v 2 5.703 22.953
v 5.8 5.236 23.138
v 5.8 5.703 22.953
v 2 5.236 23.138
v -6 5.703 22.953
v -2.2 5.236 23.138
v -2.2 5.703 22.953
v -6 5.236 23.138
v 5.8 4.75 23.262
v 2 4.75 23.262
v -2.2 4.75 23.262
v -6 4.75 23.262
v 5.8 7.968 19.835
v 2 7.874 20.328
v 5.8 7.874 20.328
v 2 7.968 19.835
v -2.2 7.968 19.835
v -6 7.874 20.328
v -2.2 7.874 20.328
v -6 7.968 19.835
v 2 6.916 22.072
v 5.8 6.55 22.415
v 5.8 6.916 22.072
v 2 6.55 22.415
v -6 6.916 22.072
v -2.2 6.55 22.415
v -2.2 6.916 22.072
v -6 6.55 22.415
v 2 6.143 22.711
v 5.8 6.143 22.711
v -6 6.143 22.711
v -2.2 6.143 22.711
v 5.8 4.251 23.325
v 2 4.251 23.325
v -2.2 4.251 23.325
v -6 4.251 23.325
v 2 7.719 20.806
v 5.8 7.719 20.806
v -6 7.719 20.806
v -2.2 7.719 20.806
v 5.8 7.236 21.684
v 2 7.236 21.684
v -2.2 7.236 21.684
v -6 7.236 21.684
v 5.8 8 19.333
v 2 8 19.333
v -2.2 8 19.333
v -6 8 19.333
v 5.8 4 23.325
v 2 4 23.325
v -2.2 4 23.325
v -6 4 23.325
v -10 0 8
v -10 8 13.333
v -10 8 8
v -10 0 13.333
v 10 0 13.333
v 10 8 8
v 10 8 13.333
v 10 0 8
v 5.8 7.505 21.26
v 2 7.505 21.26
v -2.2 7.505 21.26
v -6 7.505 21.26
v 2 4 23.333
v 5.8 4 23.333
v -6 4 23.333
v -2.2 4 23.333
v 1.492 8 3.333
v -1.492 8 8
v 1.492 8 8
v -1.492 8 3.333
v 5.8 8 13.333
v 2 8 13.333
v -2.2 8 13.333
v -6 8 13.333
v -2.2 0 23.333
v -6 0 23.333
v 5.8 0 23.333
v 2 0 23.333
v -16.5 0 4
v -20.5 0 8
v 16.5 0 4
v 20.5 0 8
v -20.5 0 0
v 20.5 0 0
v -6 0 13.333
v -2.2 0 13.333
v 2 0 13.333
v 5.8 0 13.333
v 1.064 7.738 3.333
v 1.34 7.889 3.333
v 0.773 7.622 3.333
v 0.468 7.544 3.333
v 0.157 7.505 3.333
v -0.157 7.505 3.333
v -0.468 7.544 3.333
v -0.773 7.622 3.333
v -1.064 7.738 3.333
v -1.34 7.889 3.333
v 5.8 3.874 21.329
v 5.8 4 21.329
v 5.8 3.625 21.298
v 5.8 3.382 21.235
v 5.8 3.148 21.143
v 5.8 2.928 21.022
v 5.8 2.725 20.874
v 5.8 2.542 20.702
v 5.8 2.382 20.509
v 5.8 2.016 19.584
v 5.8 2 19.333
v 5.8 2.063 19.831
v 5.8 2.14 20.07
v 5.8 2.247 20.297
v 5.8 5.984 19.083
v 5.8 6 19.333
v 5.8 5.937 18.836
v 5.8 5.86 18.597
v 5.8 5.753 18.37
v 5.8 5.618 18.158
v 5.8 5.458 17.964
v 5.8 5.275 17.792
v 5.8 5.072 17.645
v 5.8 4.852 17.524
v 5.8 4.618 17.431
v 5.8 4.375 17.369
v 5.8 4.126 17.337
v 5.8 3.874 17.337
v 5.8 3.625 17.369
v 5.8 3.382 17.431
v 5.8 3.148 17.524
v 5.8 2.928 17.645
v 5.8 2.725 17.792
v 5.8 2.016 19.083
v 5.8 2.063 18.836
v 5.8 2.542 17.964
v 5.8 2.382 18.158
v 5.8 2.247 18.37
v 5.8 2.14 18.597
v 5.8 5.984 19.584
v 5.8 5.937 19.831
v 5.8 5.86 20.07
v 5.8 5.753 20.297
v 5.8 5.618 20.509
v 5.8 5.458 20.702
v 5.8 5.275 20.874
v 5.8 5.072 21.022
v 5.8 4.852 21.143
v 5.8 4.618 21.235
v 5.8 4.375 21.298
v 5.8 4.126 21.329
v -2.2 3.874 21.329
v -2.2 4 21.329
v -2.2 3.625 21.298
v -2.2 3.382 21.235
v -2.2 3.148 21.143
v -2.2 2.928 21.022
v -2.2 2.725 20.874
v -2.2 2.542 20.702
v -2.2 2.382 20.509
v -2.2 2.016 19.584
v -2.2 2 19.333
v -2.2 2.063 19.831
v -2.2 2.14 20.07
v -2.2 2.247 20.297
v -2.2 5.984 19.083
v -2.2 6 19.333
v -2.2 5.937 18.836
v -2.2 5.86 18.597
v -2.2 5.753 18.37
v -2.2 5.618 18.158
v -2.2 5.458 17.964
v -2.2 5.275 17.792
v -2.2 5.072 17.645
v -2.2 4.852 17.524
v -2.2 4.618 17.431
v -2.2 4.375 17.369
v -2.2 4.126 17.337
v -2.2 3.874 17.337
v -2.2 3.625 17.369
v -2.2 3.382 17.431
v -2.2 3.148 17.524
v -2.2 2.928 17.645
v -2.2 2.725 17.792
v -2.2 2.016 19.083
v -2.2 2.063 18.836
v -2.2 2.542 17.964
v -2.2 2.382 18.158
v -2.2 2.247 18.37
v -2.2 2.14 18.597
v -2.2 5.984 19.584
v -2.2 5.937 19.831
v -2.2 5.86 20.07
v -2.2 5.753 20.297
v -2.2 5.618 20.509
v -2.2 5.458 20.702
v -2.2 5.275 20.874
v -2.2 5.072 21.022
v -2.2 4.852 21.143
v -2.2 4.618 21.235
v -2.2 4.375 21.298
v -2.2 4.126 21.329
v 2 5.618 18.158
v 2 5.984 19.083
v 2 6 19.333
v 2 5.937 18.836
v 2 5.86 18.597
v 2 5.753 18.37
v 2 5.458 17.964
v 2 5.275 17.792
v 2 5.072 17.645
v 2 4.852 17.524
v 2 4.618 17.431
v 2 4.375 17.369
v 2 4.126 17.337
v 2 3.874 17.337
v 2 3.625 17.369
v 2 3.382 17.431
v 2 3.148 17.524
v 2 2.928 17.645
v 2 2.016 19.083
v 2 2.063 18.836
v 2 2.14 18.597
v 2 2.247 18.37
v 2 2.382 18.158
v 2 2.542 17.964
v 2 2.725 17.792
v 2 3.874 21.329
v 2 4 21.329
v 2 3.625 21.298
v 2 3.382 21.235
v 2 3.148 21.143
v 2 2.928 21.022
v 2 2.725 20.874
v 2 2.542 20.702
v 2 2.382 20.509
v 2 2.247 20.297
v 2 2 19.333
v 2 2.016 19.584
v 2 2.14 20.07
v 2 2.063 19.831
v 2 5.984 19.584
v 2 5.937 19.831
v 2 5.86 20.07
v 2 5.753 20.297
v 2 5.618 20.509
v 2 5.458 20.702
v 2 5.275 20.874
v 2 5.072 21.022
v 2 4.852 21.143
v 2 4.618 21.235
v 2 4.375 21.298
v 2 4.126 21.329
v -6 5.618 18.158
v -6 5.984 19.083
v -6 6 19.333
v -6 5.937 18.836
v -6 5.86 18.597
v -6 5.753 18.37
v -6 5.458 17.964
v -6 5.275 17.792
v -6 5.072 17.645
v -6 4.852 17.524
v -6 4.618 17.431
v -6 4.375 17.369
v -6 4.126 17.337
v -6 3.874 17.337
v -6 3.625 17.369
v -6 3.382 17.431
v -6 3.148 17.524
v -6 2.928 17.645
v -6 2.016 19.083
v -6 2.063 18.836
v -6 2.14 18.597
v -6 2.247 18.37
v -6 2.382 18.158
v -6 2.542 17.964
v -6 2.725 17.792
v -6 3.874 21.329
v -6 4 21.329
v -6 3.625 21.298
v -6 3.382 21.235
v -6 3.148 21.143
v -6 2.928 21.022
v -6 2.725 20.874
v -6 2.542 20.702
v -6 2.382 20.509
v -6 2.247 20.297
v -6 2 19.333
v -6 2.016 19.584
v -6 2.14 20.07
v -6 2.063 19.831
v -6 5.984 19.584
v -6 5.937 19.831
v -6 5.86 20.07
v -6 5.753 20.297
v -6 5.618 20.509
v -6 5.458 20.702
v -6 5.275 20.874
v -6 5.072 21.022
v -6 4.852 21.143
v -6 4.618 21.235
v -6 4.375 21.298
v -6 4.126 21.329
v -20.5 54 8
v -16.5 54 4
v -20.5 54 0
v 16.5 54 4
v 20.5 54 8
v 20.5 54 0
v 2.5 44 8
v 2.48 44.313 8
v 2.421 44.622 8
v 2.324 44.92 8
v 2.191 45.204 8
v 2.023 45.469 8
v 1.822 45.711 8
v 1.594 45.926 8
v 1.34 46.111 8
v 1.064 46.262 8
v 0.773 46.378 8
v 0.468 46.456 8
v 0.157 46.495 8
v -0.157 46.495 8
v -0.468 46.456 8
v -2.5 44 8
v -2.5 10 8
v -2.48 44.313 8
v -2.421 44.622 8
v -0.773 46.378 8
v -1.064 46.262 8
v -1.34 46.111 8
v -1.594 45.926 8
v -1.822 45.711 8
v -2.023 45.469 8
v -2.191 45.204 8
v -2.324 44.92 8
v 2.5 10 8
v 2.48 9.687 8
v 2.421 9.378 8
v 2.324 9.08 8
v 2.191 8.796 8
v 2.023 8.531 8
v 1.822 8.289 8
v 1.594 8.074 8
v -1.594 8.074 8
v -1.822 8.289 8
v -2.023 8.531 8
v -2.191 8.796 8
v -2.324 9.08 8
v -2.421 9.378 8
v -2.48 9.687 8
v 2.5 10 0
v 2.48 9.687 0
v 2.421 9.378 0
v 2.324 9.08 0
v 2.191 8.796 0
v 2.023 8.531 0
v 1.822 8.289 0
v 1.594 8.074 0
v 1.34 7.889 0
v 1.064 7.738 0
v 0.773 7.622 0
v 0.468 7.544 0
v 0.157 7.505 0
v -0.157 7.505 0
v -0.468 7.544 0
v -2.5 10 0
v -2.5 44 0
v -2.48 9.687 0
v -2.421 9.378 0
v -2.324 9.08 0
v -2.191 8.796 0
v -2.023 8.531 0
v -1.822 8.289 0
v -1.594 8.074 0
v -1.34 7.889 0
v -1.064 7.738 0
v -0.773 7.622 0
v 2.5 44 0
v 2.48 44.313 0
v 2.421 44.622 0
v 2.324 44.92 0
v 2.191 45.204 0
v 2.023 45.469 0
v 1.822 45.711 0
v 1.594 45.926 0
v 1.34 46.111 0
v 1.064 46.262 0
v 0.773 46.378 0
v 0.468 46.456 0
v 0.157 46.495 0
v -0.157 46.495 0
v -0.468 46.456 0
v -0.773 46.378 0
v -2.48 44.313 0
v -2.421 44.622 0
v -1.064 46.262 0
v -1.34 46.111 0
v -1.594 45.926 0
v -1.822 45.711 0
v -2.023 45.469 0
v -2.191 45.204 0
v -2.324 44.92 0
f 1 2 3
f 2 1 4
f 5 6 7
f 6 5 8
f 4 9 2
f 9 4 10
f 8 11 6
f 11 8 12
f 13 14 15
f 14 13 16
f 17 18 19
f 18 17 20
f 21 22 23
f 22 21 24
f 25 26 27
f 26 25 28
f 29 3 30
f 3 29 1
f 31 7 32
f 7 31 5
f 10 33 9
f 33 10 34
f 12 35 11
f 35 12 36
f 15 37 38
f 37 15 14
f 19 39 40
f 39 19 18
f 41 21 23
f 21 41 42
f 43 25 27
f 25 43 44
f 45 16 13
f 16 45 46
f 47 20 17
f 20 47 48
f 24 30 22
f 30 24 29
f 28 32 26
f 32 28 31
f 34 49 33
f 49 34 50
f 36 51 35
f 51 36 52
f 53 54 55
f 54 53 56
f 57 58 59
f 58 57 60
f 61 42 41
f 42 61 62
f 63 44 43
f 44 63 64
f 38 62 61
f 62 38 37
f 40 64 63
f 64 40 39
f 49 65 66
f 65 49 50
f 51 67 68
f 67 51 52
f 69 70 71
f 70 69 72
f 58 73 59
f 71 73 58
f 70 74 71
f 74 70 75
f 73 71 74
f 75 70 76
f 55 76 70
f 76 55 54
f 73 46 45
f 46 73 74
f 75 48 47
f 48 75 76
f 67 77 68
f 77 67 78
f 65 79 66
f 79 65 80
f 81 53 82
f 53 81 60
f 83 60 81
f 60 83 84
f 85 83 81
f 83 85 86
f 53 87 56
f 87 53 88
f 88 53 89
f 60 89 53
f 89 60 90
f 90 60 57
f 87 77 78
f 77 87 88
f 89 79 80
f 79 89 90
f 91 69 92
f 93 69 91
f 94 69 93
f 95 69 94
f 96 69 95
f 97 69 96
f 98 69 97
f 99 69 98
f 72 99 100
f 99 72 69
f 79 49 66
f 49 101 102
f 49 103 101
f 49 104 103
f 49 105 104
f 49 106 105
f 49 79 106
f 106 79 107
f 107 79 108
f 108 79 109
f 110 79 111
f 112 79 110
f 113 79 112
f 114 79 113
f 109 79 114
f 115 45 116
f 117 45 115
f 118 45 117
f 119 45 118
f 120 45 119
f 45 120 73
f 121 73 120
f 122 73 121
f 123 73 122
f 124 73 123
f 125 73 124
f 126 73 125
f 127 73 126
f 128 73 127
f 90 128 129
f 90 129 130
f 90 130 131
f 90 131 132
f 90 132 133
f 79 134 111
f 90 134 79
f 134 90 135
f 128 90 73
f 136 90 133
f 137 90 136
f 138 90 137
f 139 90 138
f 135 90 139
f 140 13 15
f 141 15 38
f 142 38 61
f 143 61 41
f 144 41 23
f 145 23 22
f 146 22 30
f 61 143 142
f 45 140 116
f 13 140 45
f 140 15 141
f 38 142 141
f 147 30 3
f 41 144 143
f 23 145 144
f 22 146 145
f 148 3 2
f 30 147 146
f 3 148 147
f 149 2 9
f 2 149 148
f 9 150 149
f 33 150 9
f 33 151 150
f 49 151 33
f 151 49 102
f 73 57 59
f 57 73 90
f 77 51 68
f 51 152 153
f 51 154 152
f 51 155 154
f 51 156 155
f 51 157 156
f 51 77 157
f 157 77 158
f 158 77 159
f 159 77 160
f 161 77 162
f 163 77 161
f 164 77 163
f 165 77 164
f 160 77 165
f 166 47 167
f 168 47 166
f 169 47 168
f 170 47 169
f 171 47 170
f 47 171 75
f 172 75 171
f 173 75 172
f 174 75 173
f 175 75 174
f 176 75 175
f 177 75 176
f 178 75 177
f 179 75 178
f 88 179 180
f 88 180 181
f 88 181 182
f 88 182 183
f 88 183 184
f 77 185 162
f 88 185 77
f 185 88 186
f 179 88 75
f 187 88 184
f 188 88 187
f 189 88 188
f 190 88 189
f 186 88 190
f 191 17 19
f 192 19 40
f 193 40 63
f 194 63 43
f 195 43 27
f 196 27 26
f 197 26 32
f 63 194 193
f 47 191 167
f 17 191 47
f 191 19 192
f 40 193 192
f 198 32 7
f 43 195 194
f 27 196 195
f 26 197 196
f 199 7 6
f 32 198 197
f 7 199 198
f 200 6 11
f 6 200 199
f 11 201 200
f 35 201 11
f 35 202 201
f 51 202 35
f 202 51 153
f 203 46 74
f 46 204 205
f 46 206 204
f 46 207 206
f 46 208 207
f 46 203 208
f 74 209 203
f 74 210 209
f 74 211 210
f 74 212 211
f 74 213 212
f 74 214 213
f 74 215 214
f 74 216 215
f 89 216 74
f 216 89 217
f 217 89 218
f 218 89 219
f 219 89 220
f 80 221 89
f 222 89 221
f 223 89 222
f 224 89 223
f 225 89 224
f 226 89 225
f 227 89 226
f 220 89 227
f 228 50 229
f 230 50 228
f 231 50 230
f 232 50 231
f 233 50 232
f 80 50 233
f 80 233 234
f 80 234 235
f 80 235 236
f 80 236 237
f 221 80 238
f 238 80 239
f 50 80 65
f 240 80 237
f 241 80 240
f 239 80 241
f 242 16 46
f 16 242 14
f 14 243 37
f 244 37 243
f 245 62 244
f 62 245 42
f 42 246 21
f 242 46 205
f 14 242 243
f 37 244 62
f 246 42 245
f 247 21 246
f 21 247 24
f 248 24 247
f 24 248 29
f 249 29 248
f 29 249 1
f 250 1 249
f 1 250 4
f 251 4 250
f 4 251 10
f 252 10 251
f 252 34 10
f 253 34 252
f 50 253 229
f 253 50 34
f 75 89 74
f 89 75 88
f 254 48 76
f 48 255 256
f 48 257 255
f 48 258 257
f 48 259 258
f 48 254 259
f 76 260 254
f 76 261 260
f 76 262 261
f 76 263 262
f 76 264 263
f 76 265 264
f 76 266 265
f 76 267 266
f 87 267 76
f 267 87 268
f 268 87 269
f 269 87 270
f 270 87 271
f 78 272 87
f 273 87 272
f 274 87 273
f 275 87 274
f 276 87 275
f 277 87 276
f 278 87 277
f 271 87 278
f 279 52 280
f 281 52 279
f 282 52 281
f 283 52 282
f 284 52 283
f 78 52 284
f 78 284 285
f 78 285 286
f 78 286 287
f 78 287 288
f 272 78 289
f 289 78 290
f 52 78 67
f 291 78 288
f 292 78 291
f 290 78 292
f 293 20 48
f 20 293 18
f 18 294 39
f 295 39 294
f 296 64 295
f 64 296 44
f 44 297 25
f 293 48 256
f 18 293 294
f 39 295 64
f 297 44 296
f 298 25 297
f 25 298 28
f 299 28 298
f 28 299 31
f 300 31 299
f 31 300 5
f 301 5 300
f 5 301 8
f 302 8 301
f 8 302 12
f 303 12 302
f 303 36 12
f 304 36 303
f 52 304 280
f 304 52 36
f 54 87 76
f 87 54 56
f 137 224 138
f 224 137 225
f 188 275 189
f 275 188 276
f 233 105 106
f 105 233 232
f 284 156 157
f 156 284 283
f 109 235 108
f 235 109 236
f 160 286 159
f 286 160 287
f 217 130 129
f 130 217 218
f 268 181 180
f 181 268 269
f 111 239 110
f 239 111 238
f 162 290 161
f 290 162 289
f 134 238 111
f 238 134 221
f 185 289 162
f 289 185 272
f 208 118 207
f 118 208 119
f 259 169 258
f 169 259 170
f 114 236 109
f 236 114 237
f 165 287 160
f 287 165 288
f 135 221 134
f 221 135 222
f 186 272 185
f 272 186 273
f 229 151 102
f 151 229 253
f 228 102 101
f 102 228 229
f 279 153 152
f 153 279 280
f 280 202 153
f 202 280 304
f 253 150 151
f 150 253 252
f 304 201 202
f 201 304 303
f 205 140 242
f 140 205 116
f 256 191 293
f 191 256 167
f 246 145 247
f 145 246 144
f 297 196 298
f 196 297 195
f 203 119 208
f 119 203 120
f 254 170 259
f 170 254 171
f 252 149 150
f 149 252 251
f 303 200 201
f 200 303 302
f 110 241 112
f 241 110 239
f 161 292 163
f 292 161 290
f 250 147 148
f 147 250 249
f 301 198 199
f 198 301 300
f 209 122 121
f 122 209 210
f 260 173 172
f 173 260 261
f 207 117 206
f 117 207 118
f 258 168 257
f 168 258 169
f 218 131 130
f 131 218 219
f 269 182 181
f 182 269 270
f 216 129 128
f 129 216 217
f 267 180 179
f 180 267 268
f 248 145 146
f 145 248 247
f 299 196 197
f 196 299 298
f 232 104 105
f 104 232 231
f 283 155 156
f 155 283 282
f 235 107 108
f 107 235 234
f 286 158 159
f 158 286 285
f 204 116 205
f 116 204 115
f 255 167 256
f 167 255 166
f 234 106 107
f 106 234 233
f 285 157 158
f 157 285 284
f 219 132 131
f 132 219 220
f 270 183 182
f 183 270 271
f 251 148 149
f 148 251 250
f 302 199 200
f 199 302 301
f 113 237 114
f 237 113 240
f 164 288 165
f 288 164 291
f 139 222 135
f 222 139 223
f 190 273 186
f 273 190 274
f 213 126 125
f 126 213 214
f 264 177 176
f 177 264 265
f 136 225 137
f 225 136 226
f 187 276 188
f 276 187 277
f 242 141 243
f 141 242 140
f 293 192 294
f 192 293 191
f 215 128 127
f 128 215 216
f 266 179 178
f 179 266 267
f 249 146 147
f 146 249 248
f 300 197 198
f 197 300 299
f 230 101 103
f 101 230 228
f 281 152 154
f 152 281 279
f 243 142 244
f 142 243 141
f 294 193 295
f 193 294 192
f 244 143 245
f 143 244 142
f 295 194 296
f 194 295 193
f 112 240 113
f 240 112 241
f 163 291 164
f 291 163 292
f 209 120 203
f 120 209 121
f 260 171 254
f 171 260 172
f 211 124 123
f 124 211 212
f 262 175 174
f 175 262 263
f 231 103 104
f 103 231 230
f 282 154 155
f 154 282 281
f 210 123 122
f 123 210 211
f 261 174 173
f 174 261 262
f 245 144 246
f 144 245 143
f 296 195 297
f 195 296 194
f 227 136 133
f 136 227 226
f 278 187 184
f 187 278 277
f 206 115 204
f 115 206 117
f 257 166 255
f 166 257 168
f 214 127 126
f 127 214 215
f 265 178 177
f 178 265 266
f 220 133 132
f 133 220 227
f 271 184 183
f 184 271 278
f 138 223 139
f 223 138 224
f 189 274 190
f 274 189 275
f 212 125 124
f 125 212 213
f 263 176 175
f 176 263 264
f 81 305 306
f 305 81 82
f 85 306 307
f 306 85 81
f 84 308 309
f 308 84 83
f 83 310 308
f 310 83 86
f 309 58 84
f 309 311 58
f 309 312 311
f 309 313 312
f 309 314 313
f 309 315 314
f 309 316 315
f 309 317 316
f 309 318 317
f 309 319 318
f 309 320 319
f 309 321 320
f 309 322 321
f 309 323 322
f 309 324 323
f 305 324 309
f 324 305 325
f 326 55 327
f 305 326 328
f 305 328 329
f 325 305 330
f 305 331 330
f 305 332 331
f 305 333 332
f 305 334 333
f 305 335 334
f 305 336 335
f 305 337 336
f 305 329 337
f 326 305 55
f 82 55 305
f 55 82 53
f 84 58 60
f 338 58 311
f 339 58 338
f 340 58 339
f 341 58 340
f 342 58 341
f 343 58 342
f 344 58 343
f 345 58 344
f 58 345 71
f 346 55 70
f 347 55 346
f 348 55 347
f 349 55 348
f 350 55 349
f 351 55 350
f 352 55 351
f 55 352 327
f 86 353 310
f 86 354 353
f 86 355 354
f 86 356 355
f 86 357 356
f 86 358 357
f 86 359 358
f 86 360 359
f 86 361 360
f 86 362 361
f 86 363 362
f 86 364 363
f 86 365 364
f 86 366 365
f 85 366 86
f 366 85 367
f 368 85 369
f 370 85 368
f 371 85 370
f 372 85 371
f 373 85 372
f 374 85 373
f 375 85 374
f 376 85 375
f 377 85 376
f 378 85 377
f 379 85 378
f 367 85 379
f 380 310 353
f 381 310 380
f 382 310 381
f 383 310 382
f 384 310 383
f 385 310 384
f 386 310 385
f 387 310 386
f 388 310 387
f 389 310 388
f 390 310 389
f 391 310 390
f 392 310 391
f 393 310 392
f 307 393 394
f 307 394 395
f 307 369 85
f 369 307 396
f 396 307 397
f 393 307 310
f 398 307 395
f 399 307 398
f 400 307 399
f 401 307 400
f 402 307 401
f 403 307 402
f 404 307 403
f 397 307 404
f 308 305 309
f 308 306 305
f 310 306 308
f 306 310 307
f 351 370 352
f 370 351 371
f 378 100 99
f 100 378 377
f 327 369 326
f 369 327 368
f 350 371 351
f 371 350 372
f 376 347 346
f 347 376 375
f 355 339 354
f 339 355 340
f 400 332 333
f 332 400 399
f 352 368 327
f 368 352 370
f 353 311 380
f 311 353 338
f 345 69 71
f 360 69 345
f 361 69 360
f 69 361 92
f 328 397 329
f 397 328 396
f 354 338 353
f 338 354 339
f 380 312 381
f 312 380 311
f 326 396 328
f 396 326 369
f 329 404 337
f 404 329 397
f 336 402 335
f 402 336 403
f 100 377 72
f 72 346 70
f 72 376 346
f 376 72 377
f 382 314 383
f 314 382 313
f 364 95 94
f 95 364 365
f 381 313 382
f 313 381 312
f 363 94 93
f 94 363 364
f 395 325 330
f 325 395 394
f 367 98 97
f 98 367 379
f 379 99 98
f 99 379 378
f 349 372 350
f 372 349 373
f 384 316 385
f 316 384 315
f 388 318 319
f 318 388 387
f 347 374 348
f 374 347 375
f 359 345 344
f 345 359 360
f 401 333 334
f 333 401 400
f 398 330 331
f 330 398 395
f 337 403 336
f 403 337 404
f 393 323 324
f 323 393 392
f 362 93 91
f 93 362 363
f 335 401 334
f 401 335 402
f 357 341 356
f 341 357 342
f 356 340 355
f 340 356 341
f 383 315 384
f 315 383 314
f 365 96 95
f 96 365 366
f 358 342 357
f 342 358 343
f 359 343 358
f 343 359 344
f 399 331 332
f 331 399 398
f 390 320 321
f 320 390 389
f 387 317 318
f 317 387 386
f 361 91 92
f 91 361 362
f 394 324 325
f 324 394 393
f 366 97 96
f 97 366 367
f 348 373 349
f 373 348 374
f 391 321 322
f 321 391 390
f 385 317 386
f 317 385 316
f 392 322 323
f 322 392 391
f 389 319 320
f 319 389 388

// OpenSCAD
$fn=50;

//roundedRect([10,150,5], 3);

fullWidth = 20;
w = fullWidth;
h = 8;
l = 180;
pin=4;
flange = 44;
etube = 10;
d2 = 65;
d1 = 55;
base = 2;
sensor = 20;  // Make it oversize so we can use ground-glass focussing screen
fudge = 1;
hingeTol = 0.2; // tightness of fit
hingeGap = 2;   // Extra length on arms

module laserMount() 
{
  translate([fullWidth/2,-l,h])
    difference()
    {
      cylinder(h=20,r=5);
      cylinder(h=21,r=3.3);  // Shouldq be 6.5/2 but holes seem to print smaller than you ask
    }
}

module arm()
{
  translate([-w/2,-w,0])
  {
    linear_extrude(height=h)
      hull()
      {
        translate([fullWidth/2,-l])
          circle(r=5);
        square(size=[fullWidth,1]);
      }
    translate([w/2,w/2]) hinge();
    laserMount();
  }
}

module hinge(pins=2)
{
  translate([-w/2,-w/2,0]) difference()
  {
    intersection()
    {
      linear_extrude(height=h)
        hull()
        {
          square(size=fullWidth);
        }

      // This rounds off the hinge end
      difference()
      {
        translate([0,-l-fullWidth,0])
          cube([fullWidth,l+fullWidth*2,h]);
        difference()
        {
          translate([0,fullWidth-h/2,h/2])
            cube([fullWidth,h/2,h/2]);
          difference()
          {
            translate([0,fullWidth-h/2,h/2])
              rotate([0,90,0])
                cylinder(h=fullWidth,r=h/2);
            translate([0,0,0])
              cube([fullWidth,fullWidth,h/2]);
            translate([0,0,0])
              cube([fullWidth,fullWidth-h/2,h*2]);
          }
        }
      }
    }
    if (pins==2)
    {
      translate([0*w/5,w-h-hingeGap,0]) cube([w/5+hingeTol,h+hingeGap,h]);
      translate([2*w/5,w-h-hingeGap,0]) cube([w/5+hingeTol,h+hingeGap,h]);
      translate([4*w/5,w-h-hingeGap,0]) cube([w/5+hingeTol,h+hingeGap,h]);
    } else {
      translate([1*w/5,w-h-hingeGap,0]) cube([w/5+hingeTol,h+hingeGap,h]);
      translate([3*w/5,w-h-hingeGap,0]) cube([w/5+hingeTol,h+hingeGap,h]);
    }
    translate([0,w-h/2,h/2])
      rotate([0,90,0])
        cylinder(h=fullWidth,r=pin/2);
  }
}

module arca_plate(l,h=10)
{
  // Specs suggest 38mm is the width, as do measurements,
  // but when I printed at 38mm it came out too narrow to be gripped..
  width = 41;
  translate([-width/2,,0,0])
    difference()
    {
      cube([width,l,h]);
      union()
      {
        translate([-fudge,-fudge,h/2])
          prism(l+fudge*2, h/2+fudge, h/2+fudge);
        translate([-fudge,-fudge,h/2])
          prism(l+fudge*2, h/2+fudge, -h/2-fudge);
        translate([width+fudge,-fudge,h/2])
          prism(l+fudge*2, -h/2-fudge, h/2+fudge);
        translate([width+fudge,-fudge,h/2])
          prism(l+fudge*2, -h/2-fudge, -h/2-fudge);
      }
    }
}

module sensor()
{
  translate([0,-(w/4+d2/2),0])
  {
    // Hinges for laser arms
    translate([0,0,h]) rotate([0,0,180]) hinge();
    translate([0,w/2+d2,h]) hinge();
    // Adjustor plates for laser arms
    difference() {
      translate([-w/2,-w*2,0]) roundedRect([w,w*2.5,h],2);
      translate([-w/2+4,-w*2+4,0]) cylinder(h,r=2);
      translate([w/2-4,-w*2+4,0]) cylinder(h,r=2);
    }
    difference() {
      translate([-w/2,d2,0]) roundedRect([w,w*2.5,h],2);
      translate([-w/2+4,d2+w*2.5-4,0]) cylinder(h,r=2);
      translate([w/2-4,d2+w*2.5-4,0]) cylinder(h,r=2);
    }
    // Hinge for tripod mount
    translate([-d2/2-w/4,d2/2+w/4,0]) rotate([0,0,90]) hinge(pins=3);
    translate([0,w/4+d2/2,0]) 
      difference()
      {
        cylinder(r=d2/2,h=flange+etube);
        translate([0,0,flange+etube-12]) rotate([0,-90,0]) cylinder(h=100,r=2); // Screw hole
        translate([0,0,base])
          cylinder(r=d1/2,h=flange+etube+fudge);  // inside
        translate([0,0,-fudge/2])
          cylinder(r=sensor/2,h=base+fudge);  // sensor hole
      }
  }
}

module mount()
{
  translate([0,0,2*w/3]) rotate([90,0,180]) hinge();
  difference ()
  {
    arca_plate(flange+etube,8);
    linear_extrude(height=30)
      hull()
      {
        translate([0,10,0]) circle(r=2.5);
        translate([0,flange+etube-10,0]) circle(r=2.5);
      }
  }
}

//arm();
//sensor();
mount();

//Draw a prism based on a 
//right angled triangle
//l - length of prism
//w - width of triangle
//h - height of triangle
module prism(l, w, h) {
       polyhedron(points=[
               [0,0,h],           // 0    front top corner
               [0,0,0],[w,0,0],   // 1, 2 front left & right bottom corners
               [0,l,h],           // 3    back top corner
               [0,l,0],[w,l,0]    // 4, 5 back left & right bottom corners
       ], faces=[ // points for all faces must be ordered clockwise when looking in
               [0,2,1],    // top face
               [3,4,5],    // base face
               [0,1,4,3],  // h face
               [1,2,5,4],  // w face
               [0,3,5,2],  // hypotenuse face
       ]);
}

module roundedRect(size, radius)
{
    x = size[0];
    y = size[1];
    z = size[2];
    linear_extrude(height=z)
    hull()
    {
        // place 4 circles in the corners, with the given radius
        translate([(radius/2), (radius/2), 0])
        circle(r=radius);

        translate([x-(radius/2), (radius/2), 0])
        circle(r=radius);

        translate([(radius/2), y-(radius/2), 0])
        circle(r=radius);

        translate([x-(radius/2), y-(radius/2), 0])
        circle(r=radius);
    }
}
